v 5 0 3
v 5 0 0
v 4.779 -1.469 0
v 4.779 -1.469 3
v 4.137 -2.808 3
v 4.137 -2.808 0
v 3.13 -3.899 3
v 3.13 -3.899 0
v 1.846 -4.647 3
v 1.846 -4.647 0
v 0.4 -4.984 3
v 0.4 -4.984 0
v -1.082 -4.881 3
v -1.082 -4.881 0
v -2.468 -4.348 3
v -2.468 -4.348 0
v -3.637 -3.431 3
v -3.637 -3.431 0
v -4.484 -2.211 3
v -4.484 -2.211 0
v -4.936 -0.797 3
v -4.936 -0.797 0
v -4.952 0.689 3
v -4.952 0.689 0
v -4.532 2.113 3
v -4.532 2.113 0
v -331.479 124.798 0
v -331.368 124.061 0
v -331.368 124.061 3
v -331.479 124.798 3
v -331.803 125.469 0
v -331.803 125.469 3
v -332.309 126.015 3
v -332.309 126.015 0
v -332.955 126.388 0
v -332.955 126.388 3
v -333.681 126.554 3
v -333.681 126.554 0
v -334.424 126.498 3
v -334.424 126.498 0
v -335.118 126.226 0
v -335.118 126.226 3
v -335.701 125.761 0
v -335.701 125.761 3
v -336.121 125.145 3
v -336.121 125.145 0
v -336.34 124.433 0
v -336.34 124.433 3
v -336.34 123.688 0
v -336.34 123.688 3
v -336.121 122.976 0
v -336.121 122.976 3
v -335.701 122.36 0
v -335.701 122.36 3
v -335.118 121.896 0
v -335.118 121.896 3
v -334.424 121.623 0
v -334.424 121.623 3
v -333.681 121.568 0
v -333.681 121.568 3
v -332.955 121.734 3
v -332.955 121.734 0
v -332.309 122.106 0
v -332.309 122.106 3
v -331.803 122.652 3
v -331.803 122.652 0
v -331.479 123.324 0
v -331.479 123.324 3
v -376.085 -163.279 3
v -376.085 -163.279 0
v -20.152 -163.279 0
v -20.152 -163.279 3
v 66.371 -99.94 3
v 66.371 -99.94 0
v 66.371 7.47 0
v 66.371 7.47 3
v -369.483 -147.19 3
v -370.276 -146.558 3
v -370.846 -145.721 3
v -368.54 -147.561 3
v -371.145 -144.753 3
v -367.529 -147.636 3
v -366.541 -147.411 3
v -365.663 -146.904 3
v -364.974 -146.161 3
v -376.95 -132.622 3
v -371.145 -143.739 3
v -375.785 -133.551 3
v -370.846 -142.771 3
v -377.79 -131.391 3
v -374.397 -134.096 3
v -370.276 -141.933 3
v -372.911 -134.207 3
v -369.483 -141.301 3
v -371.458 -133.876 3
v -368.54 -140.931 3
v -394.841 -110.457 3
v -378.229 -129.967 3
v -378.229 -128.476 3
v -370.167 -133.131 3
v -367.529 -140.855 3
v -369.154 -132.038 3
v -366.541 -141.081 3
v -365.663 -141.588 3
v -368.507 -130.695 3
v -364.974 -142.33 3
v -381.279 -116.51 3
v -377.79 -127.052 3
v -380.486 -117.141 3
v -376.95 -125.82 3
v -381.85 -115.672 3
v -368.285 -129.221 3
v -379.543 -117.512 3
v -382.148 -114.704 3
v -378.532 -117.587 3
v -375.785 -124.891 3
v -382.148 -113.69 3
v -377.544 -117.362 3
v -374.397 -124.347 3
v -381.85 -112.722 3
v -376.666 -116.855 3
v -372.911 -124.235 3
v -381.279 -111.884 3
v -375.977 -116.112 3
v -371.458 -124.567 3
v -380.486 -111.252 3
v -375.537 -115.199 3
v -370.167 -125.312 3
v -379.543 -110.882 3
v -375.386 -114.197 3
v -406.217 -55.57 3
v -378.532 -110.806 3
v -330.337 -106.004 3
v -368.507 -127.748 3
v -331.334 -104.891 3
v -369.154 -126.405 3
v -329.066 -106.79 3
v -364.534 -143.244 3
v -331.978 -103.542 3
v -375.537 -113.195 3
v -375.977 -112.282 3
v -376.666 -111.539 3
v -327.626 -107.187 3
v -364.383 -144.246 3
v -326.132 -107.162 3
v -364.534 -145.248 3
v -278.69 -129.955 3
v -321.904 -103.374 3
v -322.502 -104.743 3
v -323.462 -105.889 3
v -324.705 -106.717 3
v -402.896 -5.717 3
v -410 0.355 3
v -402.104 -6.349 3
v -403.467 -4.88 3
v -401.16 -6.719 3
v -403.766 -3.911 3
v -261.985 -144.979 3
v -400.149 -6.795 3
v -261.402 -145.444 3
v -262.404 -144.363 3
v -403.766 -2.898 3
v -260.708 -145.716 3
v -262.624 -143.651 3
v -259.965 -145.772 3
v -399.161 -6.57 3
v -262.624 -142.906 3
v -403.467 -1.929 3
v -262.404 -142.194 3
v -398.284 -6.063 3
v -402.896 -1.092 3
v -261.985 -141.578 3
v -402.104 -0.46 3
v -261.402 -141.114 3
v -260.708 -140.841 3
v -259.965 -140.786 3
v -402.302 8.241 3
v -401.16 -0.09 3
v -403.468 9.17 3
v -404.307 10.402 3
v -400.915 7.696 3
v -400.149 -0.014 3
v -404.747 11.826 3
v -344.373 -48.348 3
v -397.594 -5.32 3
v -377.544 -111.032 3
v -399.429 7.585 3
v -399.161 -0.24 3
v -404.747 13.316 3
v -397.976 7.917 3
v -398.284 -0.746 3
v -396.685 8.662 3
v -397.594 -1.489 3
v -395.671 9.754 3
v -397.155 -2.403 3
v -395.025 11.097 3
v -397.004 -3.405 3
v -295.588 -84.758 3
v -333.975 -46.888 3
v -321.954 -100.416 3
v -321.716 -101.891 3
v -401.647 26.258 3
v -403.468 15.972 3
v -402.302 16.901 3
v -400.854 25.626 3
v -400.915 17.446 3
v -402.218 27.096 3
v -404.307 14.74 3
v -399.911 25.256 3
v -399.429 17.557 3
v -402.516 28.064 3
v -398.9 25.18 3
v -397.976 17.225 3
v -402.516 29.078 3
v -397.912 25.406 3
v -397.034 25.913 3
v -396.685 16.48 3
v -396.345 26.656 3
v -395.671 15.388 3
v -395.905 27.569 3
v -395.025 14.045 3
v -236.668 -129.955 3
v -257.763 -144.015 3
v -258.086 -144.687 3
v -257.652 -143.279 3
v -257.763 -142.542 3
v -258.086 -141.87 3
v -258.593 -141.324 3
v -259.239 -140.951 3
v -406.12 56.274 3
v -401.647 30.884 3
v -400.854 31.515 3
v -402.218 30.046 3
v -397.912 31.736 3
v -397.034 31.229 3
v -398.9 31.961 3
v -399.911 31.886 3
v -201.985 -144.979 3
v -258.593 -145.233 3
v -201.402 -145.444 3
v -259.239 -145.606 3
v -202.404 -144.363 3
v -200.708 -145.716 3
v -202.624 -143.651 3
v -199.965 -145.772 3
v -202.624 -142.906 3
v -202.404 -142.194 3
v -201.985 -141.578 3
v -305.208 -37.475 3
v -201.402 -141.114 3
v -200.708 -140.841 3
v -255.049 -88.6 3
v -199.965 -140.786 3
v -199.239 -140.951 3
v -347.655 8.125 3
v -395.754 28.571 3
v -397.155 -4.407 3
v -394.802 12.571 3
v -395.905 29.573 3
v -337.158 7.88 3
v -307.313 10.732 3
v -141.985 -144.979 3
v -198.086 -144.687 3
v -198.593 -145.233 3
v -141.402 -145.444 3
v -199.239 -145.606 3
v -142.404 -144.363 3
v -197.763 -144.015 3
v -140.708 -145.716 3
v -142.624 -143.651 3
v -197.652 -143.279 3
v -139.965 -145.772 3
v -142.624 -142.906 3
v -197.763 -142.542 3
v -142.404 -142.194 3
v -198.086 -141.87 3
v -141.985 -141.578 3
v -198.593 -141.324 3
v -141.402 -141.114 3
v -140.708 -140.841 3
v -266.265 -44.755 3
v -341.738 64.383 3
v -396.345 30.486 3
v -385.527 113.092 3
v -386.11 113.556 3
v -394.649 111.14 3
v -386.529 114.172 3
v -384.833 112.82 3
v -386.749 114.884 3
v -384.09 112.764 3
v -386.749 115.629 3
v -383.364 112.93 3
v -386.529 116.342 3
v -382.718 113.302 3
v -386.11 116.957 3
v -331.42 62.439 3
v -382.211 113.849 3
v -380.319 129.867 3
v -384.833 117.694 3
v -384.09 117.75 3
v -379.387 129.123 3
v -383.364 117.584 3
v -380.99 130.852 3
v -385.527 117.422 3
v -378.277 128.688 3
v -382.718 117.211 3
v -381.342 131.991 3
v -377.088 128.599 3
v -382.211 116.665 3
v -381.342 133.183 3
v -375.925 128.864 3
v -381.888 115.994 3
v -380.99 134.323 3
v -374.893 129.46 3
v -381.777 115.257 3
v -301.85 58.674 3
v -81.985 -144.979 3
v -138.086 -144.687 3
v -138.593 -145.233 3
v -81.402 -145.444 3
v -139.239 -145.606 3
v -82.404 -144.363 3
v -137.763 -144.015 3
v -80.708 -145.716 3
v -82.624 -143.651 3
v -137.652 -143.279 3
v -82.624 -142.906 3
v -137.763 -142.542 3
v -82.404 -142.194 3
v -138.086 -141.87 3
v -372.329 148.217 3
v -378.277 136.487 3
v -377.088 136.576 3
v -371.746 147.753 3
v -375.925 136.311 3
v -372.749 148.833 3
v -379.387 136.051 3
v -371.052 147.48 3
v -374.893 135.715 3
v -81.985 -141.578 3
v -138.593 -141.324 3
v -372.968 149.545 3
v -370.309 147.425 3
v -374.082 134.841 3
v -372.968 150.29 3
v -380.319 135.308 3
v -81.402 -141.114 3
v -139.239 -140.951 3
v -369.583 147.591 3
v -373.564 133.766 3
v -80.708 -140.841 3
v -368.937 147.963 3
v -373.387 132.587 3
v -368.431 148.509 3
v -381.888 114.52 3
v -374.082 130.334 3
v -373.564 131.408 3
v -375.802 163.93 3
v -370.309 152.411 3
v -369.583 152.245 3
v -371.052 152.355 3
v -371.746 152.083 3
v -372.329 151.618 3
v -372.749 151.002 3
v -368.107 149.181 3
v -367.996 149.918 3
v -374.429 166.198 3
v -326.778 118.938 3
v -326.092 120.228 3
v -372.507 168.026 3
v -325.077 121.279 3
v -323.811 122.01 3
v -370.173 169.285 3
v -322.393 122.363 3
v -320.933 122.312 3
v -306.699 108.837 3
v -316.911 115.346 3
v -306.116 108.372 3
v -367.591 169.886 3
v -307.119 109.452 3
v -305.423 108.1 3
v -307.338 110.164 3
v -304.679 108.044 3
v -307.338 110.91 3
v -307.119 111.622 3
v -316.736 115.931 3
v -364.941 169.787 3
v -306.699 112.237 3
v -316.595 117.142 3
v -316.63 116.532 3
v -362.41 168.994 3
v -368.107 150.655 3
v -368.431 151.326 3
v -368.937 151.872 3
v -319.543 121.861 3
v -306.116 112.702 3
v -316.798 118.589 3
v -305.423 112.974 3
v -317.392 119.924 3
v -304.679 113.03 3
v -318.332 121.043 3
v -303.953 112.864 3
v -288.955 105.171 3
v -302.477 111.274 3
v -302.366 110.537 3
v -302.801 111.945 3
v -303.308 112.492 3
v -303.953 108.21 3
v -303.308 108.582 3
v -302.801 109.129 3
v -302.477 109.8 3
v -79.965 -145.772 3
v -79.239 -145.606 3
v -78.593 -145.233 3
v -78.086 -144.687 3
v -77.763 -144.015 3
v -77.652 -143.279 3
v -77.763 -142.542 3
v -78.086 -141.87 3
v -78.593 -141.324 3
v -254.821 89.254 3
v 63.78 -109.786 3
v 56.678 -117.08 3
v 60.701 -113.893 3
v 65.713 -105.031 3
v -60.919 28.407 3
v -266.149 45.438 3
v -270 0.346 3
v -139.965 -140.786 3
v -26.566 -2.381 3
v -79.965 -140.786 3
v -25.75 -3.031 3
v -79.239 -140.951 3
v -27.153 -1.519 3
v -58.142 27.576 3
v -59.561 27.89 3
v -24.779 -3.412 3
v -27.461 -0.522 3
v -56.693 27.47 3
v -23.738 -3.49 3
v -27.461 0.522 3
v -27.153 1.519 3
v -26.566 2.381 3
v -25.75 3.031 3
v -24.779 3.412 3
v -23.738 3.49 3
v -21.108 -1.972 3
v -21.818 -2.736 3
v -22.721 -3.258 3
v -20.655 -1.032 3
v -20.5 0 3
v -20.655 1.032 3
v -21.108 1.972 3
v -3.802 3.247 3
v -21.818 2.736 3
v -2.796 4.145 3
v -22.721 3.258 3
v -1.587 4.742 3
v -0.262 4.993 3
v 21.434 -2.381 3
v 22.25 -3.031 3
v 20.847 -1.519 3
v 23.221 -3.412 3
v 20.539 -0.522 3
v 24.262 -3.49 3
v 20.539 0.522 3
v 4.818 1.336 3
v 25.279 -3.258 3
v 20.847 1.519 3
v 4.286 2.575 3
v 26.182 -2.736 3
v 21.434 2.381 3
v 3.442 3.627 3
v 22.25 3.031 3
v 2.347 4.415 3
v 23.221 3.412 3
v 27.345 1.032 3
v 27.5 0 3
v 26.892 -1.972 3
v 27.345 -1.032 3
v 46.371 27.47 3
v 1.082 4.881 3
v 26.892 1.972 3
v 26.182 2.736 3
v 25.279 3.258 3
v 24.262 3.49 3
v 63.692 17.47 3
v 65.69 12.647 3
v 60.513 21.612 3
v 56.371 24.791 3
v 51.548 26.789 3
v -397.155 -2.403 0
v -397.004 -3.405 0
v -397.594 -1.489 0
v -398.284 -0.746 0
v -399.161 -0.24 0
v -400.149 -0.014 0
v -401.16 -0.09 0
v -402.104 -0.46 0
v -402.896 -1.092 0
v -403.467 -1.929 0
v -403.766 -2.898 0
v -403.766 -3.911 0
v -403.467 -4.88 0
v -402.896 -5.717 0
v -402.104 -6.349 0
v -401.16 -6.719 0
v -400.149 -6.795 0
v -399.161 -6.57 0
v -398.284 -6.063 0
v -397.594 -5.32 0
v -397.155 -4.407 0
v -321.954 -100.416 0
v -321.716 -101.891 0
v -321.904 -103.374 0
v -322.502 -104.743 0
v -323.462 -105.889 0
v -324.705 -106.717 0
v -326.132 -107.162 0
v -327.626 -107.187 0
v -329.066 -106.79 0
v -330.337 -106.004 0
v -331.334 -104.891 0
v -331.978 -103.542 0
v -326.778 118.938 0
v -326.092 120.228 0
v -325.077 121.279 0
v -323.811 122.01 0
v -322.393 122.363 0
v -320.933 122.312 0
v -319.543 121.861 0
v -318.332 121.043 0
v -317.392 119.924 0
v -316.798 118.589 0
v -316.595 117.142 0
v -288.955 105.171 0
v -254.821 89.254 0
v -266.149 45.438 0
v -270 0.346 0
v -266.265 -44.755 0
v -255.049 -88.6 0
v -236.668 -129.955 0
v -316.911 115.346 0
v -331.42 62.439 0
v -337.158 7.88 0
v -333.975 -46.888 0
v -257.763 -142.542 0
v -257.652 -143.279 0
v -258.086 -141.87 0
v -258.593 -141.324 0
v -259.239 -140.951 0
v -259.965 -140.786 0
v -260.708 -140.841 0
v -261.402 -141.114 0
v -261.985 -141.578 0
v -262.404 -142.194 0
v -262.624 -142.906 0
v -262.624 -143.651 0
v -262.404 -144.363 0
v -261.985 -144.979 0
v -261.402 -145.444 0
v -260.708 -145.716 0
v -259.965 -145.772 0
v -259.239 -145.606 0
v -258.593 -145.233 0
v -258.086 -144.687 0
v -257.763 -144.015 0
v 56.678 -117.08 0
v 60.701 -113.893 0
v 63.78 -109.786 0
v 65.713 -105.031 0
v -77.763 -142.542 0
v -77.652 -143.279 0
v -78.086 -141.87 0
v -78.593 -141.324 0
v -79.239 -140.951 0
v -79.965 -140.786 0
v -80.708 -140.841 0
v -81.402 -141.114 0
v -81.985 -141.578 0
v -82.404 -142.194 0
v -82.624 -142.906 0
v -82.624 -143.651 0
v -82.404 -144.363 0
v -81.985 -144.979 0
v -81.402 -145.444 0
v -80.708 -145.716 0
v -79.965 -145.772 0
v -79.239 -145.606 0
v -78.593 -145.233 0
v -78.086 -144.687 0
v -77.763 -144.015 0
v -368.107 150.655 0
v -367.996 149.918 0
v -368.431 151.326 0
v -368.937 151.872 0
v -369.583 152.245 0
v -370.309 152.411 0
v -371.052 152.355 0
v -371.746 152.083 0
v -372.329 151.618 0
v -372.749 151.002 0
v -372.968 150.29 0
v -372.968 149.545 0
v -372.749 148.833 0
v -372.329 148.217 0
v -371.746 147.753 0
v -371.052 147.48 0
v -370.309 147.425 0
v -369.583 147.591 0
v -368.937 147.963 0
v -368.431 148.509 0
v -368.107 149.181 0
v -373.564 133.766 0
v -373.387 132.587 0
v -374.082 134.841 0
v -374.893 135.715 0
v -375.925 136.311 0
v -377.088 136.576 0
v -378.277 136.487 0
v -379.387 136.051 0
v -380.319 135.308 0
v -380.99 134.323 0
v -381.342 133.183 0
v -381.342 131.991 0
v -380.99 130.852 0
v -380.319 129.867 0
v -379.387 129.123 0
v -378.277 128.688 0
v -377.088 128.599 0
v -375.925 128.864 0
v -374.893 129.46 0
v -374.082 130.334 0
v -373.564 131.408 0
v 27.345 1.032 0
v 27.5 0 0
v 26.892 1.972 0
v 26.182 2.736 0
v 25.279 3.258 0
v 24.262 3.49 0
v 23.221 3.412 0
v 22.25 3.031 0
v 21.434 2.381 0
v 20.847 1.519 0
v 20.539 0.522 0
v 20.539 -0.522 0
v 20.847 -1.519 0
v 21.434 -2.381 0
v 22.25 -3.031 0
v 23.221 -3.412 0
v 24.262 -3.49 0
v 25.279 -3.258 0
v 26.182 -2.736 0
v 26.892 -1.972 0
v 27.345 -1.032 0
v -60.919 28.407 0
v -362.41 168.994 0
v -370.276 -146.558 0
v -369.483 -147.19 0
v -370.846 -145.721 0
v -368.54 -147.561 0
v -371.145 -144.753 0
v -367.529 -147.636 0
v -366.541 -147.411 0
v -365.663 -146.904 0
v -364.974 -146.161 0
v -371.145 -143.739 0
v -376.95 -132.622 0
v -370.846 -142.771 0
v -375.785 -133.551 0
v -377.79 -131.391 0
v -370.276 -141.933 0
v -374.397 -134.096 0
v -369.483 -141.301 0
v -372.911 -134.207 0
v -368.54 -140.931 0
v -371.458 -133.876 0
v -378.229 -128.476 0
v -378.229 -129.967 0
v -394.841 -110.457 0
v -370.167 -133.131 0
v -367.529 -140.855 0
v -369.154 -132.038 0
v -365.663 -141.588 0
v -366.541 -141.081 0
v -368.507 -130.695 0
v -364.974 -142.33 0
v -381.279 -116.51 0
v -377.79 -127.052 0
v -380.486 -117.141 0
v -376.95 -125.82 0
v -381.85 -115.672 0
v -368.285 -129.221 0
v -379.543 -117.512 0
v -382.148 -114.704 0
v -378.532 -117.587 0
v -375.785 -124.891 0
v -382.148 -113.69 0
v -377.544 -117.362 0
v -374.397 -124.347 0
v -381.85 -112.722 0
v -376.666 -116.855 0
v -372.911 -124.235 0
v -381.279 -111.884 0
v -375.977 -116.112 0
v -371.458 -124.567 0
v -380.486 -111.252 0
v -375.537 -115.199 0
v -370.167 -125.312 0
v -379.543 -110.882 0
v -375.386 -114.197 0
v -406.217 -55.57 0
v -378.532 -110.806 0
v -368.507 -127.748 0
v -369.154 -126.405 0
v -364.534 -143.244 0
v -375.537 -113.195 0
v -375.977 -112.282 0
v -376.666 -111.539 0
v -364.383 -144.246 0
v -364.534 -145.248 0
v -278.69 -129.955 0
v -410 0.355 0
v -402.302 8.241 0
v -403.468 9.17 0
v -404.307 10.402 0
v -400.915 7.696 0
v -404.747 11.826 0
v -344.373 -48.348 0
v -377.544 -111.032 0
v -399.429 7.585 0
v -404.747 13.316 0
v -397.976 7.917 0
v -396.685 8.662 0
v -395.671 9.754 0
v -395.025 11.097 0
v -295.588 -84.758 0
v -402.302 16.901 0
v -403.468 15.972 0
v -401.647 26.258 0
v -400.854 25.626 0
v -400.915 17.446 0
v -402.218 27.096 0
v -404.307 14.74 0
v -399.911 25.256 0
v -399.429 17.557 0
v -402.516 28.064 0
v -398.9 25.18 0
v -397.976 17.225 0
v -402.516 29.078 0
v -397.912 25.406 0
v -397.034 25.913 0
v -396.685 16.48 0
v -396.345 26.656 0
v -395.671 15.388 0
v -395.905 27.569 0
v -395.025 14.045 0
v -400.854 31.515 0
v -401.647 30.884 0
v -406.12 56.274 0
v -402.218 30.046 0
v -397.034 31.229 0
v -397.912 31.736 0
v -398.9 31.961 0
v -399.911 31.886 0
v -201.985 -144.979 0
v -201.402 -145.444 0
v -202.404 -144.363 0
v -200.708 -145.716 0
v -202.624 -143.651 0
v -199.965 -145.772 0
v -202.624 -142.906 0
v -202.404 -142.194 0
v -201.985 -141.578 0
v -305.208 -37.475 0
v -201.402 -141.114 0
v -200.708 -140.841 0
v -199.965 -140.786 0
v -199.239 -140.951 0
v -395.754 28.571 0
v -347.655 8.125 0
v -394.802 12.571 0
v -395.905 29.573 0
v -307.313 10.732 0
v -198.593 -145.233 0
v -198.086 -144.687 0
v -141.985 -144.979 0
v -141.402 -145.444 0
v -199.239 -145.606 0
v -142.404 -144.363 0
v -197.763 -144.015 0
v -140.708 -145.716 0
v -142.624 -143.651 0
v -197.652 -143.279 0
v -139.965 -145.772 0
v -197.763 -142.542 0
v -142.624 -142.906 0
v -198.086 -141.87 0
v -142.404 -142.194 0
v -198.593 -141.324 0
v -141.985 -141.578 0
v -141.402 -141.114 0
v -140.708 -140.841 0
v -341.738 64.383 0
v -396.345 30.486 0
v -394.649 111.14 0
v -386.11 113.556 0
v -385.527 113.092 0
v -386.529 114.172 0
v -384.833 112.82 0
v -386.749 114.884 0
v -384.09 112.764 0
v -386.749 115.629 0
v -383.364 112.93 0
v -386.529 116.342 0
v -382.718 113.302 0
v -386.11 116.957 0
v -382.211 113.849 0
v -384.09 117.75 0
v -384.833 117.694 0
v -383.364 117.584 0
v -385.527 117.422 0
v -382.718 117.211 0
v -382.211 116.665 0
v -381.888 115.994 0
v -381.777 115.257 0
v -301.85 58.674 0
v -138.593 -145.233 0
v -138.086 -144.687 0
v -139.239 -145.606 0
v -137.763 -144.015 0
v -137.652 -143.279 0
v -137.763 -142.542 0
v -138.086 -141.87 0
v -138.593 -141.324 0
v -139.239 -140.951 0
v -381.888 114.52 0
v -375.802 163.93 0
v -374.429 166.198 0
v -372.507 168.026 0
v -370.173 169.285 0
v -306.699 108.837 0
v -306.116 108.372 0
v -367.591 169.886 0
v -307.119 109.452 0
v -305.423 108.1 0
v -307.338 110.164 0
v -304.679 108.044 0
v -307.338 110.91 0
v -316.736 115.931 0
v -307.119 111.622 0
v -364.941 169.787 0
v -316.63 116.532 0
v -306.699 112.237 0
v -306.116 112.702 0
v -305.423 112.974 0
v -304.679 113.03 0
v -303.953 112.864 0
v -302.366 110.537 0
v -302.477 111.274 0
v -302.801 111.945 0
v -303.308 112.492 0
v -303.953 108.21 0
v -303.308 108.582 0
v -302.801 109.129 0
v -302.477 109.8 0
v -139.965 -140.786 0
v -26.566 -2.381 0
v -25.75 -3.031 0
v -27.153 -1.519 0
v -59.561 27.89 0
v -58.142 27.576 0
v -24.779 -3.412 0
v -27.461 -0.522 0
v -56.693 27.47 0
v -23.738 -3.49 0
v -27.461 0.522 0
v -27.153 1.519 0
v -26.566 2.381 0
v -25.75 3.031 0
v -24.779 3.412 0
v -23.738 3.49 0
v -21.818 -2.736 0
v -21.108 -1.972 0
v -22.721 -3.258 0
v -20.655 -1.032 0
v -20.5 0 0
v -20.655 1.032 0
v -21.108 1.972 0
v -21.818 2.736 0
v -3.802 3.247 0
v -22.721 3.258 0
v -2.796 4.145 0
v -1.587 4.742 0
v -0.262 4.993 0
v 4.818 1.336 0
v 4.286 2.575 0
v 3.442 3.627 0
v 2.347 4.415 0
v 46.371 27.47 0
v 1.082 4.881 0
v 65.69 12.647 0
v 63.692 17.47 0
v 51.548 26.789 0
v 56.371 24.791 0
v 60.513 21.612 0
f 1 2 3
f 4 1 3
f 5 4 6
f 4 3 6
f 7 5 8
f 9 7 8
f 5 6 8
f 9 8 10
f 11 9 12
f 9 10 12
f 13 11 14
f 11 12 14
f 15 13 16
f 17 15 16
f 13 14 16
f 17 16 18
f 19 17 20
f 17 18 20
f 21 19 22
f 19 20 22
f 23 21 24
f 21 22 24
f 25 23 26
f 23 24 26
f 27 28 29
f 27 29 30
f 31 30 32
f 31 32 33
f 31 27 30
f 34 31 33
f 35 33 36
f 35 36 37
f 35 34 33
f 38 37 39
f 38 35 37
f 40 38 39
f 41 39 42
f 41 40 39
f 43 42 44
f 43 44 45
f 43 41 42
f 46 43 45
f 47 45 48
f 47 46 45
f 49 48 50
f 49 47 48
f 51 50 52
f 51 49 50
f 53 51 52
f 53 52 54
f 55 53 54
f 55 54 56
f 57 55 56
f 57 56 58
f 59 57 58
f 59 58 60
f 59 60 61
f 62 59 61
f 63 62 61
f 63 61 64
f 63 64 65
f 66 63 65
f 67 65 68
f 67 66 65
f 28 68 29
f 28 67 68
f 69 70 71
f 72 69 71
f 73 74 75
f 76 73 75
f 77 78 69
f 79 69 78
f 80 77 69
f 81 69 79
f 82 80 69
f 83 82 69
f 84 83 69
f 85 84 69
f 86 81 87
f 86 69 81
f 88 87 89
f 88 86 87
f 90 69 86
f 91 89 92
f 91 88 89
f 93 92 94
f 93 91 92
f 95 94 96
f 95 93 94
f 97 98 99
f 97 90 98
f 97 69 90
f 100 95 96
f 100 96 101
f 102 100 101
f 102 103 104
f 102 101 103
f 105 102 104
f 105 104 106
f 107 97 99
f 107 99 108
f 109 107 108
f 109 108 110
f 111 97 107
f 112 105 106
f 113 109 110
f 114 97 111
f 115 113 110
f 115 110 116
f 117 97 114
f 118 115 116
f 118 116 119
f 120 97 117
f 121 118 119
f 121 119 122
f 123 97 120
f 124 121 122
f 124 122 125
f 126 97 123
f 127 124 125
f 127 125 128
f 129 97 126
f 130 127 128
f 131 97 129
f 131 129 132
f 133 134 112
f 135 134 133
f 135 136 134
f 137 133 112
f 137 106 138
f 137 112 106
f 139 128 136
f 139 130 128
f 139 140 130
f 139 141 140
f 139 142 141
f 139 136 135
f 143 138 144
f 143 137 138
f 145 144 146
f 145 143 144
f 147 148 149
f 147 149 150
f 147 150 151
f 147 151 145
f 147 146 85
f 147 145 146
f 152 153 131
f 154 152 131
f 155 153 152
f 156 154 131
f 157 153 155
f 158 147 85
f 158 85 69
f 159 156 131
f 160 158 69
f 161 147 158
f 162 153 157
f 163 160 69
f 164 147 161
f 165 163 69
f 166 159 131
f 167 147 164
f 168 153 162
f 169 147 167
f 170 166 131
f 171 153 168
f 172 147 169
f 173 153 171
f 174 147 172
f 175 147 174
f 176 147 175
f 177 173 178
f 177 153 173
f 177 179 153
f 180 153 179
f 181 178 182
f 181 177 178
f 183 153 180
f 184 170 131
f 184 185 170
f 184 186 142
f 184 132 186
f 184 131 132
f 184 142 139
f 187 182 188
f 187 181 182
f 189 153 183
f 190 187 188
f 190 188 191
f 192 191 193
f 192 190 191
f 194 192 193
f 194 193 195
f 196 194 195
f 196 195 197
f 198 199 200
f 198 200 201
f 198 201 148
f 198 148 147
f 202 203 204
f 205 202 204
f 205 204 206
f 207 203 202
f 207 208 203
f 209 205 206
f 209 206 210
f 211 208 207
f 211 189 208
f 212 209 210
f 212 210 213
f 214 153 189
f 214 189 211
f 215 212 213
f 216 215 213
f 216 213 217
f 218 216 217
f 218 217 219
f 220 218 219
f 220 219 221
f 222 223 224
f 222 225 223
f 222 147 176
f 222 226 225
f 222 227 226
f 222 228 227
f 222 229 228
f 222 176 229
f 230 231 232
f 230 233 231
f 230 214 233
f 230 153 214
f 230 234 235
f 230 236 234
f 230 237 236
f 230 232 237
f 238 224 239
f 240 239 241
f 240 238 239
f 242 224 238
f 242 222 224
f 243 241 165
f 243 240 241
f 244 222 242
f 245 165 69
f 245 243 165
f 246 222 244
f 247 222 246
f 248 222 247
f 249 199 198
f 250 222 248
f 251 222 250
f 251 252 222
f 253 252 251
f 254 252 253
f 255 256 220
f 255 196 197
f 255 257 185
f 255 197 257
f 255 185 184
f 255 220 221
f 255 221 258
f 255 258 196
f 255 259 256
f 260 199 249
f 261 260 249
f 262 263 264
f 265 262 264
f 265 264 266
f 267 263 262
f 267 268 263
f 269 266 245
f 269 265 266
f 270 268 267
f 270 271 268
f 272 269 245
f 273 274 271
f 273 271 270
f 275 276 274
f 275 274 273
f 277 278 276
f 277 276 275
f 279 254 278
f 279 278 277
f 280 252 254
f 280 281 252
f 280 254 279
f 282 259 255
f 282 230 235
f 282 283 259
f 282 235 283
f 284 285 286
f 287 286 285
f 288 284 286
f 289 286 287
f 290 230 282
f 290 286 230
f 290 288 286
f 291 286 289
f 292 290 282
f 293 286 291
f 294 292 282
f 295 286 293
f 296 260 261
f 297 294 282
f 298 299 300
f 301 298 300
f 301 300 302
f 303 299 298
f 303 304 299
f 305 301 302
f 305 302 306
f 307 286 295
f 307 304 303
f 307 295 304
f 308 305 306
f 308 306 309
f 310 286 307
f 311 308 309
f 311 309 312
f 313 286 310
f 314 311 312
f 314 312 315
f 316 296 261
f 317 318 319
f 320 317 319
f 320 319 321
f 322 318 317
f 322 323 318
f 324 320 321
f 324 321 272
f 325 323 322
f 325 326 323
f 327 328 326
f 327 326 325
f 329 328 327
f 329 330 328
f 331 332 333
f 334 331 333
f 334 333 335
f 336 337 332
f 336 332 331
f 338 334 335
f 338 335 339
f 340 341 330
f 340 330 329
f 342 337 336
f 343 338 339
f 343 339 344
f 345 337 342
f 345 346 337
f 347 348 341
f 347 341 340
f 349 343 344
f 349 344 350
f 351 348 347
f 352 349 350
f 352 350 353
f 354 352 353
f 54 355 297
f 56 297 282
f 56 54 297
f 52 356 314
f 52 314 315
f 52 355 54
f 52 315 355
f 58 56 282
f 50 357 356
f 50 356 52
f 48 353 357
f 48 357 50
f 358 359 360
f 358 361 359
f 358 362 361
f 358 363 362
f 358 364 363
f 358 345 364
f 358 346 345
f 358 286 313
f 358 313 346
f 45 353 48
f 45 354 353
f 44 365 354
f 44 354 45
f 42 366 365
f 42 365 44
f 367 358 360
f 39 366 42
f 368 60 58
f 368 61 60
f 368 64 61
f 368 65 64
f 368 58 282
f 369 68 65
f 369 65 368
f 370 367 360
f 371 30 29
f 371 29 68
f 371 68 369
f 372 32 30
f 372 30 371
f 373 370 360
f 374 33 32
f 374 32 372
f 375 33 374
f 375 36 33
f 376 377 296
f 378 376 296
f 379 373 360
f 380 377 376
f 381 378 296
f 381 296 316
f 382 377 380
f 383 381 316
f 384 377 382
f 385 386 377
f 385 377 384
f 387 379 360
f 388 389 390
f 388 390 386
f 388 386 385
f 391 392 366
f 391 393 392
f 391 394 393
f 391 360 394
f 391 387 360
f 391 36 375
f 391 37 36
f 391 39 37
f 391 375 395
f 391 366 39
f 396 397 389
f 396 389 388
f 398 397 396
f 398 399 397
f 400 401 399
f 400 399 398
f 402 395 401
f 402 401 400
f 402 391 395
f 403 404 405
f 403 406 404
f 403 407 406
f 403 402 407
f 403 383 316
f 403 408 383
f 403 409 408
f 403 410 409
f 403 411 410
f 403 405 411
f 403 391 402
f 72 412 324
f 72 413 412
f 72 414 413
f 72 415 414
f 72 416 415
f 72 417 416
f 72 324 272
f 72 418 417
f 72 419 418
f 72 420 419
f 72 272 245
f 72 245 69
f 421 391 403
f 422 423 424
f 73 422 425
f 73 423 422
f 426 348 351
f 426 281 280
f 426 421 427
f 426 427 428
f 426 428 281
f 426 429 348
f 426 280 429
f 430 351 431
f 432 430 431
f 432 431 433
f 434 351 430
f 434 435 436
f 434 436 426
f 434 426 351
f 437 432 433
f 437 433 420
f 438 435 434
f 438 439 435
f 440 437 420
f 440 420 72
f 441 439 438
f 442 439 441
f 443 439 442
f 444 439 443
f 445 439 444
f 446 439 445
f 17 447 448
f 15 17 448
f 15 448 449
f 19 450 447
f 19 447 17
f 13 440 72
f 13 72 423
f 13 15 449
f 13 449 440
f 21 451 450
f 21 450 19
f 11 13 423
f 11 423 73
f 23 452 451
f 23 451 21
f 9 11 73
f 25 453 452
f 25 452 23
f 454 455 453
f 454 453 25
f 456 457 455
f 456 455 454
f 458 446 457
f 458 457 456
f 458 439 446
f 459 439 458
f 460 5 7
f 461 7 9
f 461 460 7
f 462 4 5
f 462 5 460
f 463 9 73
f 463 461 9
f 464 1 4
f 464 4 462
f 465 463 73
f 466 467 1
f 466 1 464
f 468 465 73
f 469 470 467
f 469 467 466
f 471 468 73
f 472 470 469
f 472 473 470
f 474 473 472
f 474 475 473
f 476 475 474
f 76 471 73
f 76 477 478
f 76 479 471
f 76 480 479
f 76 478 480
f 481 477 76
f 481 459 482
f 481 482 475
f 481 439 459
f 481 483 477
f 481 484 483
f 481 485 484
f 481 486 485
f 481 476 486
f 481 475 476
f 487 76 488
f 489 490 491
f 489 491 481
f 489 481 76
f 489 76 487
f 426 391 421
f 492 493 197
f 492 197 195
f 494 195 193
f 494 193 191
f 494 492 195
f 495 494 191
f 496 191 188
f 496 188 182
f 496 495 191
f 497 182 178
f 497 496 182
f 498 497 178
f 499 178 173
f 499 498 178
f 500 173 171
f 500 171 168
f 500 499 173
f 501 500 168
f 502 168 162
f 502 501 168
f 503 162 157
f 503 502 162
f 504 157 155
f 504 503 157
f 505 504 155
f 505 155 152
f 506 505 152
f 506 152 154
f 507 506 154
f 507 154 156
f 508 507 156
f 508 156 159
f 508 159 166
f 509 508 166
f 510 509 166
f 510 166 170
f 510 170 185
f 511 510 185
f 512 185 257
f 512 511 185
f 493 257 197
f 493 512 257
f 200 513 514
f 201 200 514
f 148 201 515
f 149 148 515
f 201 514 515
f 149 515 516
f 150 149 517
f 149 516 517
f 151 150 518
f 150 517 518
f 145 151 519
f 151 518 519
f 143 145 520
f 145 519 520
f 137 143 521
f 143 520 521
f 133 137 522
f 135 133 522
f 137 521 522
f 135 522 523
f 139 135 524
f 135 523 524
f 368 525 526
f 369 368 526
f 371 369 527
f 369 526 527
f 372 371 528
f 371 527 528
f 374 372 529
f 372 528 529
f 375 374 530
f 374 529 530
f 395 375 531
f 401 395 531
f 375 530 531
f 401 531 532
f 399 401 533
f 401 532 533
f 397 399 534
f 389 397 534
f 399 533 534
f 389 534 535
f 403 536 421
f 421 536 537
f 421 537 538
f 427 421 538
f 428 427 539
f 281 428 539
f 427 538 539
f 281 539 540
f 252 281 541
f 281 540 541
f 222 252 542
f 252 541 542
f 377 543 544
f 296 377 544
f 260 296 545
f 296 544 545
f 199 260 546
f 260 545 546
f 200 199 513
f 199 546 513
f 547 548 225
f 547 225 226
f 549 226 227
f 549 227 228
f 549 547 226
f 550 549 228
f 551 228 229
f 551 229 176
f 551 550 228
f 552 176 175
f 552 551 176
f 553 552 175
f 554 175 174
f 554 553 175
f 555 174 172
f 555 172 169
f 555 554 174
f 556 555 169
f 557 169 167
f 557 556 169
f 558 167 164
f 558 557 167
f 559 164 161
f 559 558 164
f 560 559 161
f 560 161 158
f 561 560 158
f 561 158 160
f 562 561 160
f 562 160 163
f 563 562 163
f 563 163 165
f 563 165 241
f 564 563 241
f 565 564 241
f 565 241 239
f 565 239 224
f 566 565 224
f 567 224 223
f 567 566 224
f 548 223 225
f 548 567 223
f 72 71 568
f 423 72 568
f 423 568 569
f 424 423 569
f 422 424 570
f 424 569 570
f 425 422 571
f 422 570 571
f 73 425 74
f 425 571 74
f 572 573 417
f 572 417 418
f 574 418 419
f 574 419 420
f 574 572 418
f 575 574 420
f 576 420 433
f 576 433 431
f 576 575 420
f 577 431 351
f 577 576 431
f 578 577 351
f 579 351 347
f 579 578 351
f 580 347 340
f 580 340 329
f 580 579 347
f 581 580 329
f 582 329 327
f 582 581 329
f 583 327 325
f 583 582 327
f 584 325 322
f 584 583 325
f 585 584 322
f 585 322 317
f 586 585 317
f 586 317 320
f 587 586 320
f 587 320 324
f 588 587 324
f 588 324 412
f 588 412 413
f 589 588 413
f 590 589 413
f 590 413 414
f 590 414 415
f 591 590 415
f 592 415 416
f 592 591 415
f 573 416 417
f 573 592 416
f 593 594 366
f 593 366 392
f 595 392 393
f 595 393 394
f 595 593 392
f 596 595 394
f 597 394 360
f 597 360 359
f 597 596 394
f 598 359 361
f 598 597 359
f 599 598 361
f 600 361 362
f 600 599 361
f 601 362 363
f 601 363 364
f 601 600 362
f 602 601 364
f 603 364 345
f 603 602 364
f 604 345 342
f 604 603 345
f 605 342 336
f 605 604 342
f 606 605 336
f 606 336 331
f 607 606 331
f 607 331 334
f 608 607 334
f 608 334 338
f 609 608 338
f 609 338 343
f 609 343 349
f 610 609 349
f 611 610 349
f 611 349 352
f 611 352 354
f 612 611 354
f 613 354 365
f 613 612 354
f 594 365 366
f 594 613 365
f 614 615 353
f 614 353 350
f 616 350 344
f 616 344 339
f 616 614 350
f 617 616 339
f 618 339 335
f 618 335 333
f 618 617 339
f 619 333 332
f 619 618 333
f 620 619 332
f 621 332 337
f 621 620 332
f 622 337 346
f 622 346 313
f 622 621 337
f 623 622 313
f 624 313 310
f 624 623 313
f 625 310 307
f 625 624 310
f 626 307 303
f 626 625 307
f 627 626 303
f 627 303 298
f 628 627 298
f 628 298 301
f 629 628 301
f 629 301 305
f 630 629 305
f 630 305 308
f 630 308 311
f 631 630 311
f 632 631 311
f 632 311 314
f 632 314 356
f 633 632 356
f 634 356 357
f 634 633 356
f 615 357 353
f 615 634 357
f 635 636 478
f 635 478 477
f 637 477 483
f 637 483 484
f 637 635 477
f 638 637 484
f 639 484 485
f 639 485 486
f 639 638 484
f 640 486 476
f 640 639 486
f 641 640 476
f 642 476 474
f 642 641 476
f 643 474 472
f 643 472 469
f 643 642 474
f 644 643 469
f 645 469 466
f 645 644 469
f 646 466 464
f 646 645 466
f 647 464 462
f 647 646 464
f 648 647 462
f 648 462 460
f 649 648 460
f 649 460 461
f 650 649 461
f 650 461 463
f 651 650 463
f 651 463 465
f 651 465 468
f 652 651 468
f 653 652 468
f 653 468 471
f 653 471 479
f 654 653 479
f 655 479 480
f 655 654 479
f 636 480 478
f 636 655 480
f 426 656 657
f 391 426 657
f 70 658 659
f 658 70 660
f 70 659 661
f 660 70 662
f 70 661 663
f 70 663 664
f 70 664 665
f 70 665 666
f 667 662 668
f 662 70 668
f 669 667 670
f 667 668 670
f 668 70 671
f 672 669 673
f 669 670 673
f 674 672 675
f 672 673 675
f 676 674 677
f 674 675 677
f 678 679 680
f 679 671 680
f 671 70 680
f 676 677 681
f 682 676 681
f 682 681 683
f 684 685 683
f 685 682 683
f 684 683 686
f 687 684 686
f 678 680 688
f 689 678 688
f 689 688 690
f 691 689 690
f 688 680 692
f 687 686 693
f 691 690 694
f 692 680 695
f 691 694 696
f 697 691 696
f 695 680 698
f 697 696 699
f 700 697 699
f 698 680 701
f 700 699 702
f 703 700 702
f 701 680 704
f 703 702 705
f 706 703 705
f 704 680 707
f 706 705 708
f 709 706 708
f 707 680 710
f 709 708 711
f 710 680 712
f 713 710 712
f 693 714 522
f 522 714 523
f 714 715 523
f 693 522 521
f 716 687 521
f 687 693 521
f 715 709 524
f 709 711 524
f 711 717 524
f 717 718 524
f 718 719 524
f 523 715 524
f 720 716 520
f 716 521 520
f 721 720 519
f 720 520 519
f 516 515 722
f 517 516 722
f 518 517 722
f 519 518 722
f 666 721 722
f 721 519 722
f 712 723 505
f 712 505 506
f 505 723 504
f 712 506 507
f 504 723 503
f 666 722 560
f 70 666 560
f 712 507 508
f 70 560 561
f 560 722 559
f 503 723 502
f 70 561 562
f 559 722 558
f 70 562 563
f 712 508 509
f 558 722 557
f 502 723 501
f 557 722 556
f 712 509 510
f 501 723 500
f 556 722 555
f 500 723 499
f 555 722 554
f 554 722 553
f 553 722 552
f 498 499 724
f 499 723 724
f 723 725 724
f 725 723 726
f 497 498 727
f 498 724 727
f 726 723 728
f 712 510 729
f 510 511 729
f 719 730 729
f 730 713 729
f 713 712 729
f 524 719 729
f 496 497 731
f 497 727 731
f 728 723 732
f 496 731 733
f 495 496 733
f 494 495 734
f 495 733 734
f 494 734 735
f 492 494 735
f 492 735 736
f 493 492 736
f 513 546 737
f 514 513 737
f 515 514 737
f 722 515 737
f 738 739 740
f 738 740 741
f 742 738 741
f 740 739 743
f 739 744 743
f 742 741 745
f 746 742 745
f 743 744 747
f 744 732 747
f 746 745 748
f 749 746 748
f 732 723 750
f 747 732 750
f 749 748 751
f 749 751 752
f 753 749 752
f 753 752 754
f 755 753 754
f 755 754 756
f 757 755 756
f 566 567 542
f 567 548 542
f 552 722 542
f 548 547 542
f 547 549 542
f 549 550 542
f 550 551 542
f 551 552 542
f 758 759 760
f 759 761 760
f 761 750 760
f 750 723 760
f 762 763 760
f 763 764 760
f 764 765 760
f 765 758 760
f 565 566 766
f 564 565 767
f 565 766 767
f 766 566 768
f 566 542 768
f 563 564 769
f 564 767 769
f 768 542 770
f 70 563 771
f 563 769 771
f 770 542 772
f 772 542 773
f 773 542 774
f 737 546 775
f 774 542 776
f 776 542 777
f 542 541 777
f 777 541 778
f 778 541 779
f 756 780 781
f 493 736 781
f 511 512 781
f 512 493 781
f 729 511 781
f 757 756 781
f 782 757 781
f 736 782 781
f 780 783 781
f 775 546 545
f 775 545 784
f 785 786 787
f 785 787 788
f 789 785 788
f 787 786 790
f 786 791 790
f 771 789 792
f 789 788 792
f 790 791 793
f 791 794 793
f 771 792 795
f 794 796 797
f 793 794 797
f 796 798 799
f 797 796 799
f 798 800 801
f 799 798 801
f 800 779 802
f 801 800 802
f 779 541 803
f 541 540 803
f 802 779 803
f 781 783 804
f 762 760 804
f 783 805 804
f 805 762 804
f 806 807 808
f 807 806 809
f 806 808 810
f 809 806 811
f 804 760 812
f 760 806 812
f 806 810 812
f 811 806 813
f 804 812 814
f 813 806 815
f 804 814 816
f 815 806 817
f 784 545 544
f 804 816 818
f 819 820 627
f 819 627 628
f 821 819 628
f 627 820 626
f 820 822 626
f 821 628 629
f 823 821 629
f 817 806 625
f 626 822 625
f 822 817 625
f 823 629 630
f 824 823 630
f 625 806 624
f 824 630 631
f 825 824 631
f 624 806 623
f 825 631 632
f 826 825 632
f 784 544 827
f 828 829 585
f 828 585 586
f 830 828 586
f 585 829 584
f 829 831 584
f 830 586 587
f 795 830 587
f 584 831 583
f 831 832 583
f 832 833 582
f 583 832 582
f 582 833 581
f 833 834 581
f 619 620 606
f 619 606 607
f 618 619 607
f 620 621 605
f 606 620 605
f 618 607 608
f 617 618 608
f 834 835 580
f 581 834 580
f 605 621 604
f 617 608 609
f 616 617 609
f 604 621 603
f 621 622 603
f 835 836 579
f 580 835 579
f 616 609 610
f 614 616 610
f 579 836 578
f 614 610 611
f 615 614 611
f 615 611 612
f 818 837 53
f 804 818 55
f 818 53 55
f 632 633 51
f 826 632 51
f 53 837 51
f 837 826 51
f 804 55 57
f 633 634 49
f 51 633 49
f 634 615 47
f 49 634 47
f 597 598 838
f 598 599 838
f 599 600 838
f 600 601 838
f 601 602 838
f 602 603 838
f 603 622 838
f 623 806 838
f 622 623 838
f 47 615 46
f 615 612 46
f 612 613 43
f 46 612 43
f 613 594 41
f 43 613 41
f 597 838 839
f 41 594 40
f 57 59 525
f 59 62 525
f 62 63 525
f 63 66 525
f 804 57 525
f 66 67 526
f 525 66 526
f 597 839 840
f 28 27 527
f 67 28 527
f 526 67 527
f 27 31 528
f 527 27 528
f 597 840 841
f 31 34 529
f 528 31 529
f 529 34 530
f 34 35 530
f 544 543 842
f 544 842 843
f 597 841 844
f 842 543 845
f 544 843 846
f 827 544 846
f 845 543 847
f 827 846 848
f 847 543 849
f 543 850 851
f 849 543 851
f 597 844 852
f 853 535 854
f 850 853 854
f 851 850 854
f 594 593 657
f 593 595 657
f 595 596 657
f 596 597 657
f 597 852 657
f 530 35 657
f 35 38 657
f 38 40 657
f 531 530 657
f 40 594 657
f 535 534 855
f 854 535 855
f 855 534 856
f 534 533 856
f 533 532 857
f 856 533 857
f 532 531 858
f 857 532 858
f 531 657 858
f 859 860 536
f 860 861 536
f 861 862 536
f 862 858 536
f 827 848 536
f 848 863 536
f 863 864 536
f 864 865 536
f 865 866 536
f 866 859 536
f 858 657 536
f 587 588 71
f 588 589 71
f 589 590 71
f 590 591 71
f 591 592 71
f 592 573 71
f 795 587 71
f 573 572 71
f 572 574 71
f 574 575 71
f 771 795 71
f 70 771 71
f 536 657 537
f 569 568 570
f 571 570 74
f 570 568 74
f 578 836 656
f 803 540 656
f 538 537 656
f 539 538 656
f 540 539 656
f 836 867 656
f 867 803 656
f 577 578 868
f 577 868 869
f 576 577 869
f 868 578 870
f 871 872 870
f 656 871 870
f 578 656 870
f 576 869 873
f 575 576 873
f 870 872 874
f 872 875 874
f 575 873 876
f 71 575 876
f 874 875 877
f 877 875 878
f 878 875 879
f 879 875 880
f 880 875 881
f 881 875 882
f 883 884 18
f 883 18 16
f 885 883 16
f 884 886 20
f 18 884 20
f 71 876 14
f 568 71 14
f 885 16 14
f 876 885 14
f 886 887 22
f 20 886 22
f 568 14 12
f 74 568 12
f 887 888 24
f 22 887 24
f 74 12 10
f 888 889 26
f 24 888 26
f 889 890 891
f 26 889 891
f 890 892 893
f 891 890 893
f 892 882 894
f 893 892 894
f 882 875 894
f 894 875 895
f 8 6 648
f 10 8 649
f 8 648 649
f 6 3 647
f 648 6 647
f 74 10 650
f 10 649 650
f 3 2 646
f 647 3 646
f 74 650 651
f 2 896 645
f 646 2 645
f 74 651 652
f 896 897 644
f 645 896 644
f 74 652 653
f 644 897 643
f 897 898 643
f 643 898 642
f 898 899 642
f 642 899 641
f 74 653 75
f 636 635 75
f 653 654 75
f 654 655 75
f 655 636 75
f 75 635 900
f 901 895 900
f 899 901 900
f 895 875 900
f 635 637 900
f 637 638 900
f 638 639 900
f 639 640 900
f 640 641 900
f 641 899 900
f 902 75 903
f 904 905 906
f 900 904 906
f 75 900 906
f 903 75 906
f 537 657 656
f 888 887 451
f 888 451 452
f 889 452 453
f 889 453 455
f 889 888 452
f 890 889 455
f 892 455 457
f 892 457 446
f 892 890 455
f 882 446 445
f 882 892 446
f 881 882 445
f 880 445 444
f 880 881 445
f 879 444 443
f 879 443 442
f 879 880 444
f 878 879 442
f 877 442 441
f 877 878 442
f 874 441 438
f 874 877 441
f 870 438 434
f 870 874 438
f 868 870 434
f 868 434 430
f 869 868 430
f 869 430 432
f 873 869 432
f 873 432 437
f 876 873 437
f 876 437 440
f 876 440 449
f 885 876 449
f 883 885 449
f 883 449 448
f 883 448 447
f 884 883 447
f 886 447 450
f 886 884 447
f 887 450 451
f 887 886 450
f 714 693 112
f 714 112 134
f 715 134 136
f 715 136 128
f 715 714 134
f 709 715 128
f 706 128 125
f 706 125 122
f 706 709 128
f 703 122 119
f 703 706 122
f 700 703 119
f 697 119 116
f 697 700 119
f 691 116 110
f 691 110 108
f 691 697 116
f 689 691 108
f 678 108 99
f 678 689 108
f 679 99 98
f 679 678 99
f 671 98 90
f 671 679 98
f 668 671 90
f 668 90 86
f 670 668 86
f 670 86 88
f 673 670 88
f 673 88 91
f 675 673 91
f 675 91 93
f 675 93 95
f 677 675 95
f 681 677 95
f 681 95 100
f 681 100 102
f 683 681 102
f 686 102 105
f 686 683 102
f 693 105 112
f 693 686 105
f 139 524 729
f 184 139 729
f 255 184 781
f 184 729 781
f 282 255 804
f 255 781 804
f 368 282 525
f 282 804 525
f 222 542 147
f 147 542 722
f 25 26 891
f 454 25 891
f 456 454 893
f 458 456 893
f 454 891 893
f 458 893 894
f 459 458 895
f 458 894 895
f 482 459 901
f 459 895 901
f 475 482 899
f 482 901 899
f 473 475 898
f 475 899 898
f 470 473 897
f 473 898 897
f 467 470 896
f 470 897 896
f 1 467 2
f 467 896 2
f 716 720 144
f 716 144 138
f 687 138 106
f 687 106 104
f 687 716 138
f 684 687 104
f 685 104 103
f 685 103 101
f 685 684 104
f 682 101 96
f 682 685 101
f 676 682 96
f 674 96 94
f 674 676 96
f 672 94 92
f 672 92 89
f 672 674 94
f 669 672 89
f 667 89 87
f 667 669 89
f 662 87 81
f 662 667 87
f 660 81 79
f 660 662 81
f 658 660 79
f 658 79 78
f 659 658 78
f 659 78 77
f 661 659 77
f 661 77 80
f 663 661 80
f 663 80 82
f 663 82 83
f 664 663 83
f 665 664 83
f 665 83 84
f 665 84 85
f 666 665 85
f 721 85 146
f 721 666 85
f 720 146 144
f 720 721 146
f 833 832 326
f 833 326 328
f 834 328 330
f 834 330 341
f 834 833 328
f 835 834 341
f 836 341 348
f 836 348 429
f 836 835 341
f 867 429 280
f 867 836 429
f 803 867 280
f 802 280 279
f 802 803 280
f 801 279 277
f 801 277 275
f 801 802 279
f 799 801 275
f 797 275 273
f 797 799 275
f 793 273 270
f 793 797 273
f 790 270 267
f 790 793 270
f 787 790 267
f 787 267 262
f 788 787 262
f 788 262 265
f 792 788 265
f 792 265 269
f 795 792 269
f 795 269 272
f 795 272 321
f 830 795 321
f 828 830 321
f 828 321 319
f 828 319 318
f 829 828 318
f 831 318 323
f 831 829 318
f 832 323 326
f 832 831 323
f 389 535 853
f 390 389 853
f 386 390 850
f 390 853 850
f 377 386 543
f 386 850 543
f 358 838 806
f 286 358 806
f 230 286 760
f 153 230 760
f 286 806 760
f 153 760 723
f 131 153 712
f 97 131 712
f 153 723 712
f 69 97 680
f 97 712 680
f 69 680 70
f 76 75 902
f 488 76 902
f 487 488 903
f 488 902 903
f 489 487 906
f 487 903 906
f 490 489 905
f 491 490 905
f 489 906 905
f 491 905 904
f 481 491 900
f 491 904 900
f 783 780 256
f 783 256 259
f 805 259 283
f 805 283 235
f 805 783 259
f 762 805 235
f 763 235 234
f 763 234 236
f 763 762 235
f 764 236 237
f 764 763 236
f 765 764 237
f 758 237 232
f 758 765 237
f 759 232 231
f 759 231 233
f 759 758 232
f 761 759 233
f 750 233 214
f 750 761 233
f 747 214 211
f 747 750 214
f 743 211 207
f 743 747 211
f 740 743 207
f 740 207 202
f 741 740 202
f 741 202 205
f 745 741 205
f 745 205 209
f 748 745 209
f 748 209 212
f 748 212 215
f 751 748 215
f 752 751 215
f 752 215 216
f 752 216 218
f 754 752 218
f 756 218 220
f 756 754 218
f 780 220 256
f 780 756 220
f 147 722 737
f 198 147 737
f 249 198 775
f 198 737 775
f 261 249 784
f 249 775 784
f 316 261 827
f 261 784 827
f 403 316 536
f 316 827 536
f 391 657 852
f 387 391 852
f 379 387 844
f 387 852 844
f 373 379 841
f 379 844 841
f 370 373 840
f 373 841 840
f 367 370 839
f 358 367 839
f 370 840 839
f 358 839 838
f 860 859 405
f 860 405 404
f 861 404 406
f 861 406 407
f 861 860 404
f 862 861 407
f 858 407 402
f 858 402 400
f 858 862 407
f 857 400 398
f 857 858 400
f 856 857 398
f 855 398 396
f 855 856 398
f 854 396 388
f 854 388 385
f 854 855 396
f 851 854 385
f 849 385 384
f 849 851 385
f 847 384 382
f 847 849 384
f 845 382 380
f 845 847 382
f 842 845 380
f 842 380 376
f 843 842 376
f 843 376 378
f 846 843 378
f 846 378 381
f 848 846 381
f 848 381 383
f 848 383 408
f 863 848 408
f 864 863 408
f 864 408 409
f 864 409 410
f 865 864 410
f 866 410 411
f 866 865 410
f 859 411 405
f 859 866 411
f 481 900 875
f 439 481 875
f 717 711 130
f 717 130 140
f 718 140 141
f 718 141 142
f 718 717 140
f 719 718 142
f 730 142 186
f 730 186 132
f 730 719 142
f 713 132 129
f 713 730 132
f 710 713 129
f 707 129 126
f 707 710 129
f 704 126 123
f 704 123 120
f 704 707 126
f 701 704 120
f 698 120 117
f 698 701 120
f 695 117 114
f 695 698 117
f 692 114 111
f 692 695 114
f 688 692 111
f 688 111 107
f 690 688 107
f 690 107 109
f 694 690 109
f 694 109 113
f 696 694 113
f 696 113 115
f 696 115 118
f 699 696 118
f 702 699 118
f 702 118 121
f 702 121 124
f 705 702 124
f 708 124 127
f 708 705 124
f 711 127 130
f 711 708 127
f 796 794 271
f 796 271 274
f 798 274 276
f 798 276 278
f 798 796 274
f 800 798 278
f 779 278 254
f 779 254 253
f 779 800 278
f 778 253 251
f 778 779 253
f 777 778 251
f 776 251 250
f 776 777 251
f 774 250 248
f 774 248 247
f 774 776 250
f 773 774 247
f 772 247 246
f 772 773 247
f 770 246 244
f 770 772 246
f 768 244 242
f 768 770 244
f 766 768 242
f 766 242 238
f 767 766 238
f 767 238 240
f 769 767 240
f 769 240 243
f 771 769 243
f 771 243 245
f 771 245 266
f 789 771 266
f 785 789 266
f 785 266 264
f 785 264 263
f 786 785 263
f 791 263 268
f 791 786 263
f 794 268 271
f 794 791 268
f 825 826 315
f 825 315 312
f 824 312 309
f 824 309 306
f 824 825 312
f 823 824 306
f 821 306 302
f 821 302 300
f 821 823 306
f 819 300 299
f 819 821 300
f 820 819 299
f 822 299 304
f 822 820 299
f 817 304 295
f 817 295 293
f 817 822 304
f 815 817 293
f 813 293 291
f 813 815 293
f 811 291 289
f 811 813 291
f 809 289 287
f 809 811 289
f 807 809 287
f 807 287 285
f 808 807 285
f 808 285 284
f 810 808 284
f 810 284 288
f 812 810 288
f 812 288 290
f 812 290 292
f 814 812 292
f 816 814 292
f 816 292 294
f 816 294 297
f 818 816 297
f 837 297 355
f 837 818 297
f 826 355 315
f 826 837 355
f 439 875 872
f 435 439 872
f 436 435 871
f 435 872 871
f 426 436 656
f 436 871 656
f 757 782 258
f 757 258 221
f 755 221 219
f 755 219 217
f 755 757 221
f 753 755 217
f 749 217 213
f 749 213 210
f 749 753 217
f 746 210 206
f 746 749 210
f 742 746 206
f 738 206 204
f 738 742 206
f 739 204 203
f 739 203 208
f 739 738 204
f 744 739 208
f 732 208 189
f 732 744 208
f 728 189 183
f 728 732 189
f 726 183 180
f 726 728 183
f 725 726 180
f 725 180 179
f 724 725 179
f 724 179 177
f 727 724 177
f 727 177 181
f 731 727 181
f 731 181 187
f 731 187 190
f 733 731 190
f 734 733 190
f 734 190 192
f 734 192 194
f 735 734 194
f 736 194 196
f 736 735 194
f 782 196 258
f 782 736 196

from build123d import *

# Parameters (mm, degrees)
SKETCH1_R           = 3.399999992
SKETCH1_R_2         = 4.999999996
SKETCH1_R_3         = 3.4
SKETCH1_R_4         = 2.499999993
SKETCH1_R_5         = 3.399999999
SKETCH1_R_6         = 3.5
SKETCH1_R_7         = 4.999999995
SKETCH1_R_8         = 2.5
SKETCH1_R_9         = 3.999999996
BOSS_EXTRUDE1_DEPTH = 3


with BuildPart() as part:
    # Sketch1 → Boss-Extrude1 (new body)
    with BuildSketch(Plane.XY):
        with BuildLine():
            Line((-376.085243079, -163.278565422), (-350.152013506, -163.278565422))
            Line((-350.152013506, -163.278565422), (-20.152013506, -163.278565422))
            Line((-20.152013506, -163.278565422), (56.677553307, -117.080446425))
            ThreePointArc((56.677553307, -117.080446425), (63.779903671, -109.786095566), (66.371177049, -99.940475351))
            Line((66.371177049, -99.940475351), (66.371177049, 7.470187014))
            ThreePointArc((66.371177049, 7.470187014), (60.513312673, 21.612322638), (46.371177049, 27.470187014))
            Line((46.371177049, 27.470187014), (-56.693059514, 27.470187014))
            ThreePointArc((-56.693059514, 27.470187014), (-58.857455653, 27.707226943), (-60.919242131, 28.407109144))
            Line((-60.919242131, 28.407109144), (-362.409808619, 168.994469159))
            ThreePointArc((-362.409808619, 168.994469159), (-370.173396171, 169.284827359), (-375.801891017, 163.92967607))
            ThreePointArc((-375.801891017, 163.92967607), (-409.999846255, 0.355046993), (-376.085243079, -163.278565422))
        make_face()
        with Locations((-367.783184481, -144.245762074)):
            Circle(SKETCH1_R, mode=Mode.SUBTRACT)
        with Locations((-373.28475698, -129.22135859)):
            Circle(SKETCH1_R_2, mode=Mode.SUBTRACT)
        with Locations((-378.786329478, -114.196955106)):
            Circle(SKETCH1_R_3, mode=Mode.SUBTRACT)
        with Locations((-260.152013506, -143.278565422)):
            Circle(SKETCH1_R_4, mode=Mode.SUBTRACT)
        with Locations((-200.152013506, -143.278565422)):
            Circle(SKETCH1_R_4, mode=Mode.SUBTRACT)
        with Locations((-400.403512963, -3.404677757)):
            Circle(SKETCH1_R_5, mode=Mode.SUBTRACT)
        with BuildLine():
            ThreePointArc((-278.689644498, -129.955115483), (-307.207328121, -13.412961613), (-288.955480876, 105.171194074))
            Line((-288.955480876, 105.171194074), (-254.820961391, 89.254006231))
            ThreePointArc((-254.820961391, 89.254006231), (-269.078930784, -22.282930678), (-236.667843088, -129.955115483))
            Line((-236.667843088, -129.955115483), (-278.689644498, -129.955115483))
        make_face(mode=Mode.SUBTRACT)
        with Locations((-140.152013506, -143.278565422)):
            Circle(SKETCH1_R_4, mode=Mode.SUBTRACT)
        with Locations((-80.152013506, -143.278565422)):
            Circle(SKETCH1_R_4, mode=Mode.SUBTRACT)
        with Locations((-24, 0)):
            Circle(SKETCH1_R_6, mode=Mode.SUBTRACT)
        with BuildLine():
            ThreePointArc((5.00000001, 2e-09), (-1.082198053, -4.881480028), (-4.531538915, 2.113091308))
            ThreePointArc((-4.531538915, 2.113091308), (1.082198084, 4.881480032), (5.00000001, 2e-09))
        make_face(mode=Mode.SUBTRACT)
        with Locations((24, 0)):
            Circle(SKETCH1_R_6, mode=Mode.SUBTRACT)
        with Locations((-399.802415875, 12.570928686)):
            Circle(SKETCH1_R_7, mode=Mode.SUBTRACT)
        with Locations((-399.154276158, 28.570928686)):
            Circle(SKETCH1_R_3, mode=Mode.SUBTRACT)
        with BuildLine():
            ThreePointArc((-316.911336344, 115.346293338), (-337.157938663, 7.879523189), (-321.95378618, -100.415746047))
            ThreePointArc((-321.95378618, -100.415746047), (-325.402488065, -106.990809188), (-331.977551206, -103.542107303))
            ThreePointArc((-331.977551206, -103.542107303), (-347.65507241, 8.124845631), (-326.778108863, 118.937504843))
            ThreePointArc((-326.77810886, 118.937504842), (-320.933069671, 122.312139792), (-316.594722606, 117.141899091))
            ThreePointArc((-316.594722606, 117.141899091), (-316.674481903, 116.230246159), (-316.911336347, 115.346293339))
        make_face(mode=Mode.SUBTRACT)
        with Locations((-384.276933996, 115.256858232)):
            Circle(SKETCH1_R_8, mode=Mode.SUBTRACT)
        with Locations((-333.868117351, 124.060751978)):
            Circle(SKETCH1_R_8, mode=Mode.SUBTRACT)
        with Locations((-304.866268166, 110.536967602)):
            Circle(SKETCH1_R_8, mode=Mode.SUBTRACT)
        with Locations((-377.386541732, 132.587322578)):
            Circle(SKETCH1_R_9, mode=Mode.SUBTRACT)
        with Locations((-370.496149468, 149.917786924)):
            Circle(SKETCH1_R_8, mode=Mode.SUBTRACT)
    extrude(amount=BOSS_EXTRUDE1_DEPTH)


solid = part.part
